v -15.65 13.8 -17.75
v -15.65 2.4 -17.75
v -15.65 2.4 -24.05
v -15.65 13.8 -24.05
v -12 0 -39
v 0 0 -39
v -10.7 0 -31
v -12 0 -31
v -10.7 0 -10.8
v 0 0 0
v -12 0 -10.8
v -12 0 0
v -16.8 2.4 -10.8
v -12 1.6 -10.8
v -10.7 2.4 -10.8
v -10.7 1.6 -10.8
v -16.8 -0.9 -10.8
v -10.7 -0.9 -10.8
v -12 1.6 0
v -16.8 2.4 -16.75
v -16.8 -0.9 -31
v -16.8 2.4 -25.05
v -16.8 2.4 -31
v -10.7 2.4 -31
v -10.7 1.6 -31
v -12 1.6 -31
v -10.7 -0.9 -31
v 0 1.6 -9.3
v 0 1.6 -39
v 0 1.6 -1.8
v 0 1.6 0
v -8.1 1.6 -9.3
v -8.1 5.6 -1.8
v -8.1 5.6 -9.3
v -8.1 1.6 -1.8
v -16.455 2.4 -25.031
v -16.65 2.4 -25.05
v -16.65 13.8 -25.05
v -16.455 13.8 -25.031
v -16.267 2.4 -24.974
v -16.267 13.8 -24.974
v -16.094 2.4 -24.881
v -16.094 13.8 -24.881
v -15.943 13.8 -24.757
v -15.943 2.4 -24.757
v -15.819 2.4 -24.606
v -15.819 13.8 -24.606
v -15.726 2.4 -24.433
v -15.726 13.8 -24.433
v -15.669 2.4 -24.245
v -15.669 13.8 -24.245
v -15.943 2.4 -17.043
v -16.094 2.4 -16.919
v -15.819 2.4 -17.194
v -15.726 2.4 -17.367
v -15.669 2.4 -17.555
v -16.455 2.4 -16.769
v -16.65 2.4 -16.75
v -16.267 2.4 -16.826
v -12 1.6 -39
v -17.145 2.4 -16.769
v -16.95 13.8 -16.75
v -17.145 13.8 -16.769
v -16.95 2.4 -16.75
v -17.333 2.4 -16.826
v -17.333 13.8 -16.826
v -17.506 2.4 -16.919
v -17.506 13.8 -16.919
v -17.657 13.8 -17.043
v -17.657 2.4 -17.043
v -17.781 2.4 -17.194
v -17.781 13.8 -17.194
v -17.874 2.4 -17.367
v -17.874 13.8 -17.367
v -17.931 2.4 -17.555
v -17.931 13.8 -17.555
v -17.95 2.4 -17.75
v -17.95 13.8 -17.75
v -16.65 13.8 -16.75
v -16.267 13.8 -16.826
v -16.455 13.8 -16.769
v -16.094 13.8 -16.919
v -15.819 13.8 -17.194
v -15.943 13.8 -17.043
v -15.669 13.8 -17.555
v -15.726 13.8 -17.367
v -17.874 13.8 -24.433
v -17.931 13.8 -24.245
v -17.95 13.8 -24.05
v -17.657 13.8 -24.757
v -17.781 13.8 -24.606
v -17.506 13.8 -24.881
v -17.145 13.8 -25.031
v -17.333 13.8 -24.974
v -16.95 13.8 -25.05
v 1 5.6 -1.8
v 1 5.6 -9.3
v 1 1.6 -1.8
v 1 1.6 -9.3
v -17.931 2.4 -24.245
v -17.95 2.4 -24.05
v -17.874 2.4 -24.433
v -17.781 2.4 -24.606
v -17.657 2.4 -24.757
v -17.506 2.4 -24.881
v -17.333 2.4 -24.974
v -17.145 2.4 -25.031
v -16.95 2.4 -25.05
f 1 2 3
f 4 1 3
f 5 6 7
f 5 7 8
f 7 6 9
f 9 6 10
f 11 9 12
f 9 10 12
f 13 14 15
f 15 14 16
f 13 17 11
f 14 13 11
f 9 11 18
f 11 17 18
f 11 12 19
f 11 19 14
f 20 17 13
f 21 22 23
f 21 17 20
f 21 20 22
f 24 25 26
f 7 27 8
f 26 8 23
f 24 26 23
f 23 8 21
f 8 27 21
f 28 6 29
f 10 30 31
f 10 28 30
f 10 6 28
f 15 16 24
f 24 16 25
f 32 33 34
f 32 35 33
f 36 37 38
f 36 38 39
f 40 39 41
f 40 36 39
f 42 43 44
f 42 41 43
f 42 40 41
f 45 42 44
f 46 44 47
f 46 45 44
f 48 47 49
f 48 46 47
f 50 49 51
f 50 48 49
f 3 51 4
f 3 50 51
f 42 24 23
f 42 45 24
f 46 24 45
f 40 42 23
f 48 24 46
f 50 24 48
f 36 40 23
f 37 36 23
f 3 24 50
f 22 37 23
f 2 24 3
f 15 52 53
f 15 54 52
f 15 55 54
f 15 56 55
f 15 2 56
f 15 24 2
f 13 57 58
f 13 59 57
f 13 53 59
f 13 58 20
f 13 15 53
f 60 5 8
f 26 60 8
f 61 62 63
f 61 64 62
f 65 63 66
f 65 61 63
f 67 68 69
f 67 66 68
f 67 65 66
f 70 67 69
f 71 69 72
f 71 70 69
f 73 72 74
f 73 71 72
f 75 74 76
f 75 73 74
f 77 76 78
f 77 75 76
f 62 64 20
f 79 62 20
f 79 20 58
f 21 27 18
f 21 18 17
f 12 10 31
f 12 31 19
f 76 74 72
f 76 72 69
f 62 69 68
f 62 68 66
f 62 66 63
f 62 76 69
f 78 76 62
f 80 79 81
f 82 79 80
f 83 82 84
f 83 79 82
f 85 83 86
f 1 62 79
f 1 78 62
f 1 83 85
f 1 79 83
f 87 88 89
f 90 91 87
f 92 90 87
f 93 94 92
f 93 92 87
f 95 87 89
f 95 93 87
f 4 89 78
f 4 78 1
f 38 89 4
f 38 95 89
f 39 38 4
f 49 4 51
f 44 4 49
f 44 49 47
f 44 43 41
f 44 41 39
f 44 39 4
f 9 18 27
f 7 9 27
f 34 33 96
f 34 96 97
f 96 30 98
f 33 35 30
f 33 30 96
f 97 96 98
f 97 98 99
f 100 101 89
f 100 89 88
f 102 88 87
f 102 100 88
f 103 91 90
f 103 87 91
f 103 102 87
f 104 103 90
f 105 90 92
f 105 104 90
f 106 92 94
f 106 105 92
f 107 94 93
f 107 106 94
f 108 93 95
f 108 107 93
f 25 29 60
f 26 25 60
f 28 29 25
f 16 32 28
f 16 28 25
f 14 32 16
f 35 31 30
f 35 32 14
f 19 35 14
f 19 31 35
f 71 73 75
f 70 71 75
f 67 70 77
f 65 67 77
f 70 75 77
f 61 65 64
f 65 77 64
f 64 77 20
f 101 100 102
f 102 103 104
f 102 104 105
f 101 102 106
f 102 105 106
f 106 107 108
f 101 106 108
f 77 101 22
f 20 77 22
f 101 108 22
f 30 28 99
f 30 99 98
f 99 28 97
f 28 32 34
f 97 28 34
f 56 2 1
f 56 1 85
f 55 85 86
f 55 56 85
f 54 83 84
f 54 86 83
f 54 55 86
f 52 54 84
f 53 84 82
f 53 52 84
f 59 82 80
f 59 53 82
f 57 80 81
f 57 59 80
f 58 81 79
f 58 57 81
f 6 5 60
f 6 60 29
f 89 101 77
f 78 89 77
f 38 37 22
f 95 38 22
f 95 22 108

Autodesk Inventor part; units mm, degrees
ref_plane "YZ Plane" through (0, 0, 0) normal (1, 0, 0) x (0, 1, 0)
ref_plane "XZ Plane" through (0, 0, 0) normal (0, 1, 0) x (-1, 0, 0)
ref_plane "XY Plane" through (0, 0, 0) normal (0, 0, 1) x (1, 0, 0)
sketch "Sketch1" plane through (0, 0, 0) normal (0, 1, 0) x (-1, 0, 0)
  line L0 (0, 0) -> (16.8, 0)
  line L1 (16.8, 0) -> (16.8, -39)
  line L2 (16.8, -39) -> (0, -39)
  line L3 (0, -39) -> (0, 0)
  line L4 (16.8, -10.8) -> (10.7, -10.8)
  line L5 (10.7, -10.8) -> (10.7, -31)
  line L6 (10.7, -31) -> (16.8, -31)
  line L7 (16.8, -31) -> (16.8, -10.8)
  line L8 (0, -25.4905) -> (10.7, -25.4905)
  line L9 (10.7, -25.4905) -> (10.7, -14.3627)
  line L10 (10.7, -14.3627) -> (0, -14.3627)
  line L11 (0, -14.3627) -> (0, -25.4905)
  dimension "d0" = 16.8
  dimension "d1" = 39
  dimension "d2" = 6.1
  dimension "d3" = 20.2
  dimension "d4" = 0
  dimension "d5" = 10.7
  dimension "d6" = 8
extrude "Extrusion1" add sketch "Sketch1" along normal blind 1.6 contours L0 L1 L4 L5 L10 L3 | L10 L5 L8 L3 | L8 L5 L6 L1 L2 L3
extrude "Extrusion2" add sketch "Sketch1" along normal blind 2.4 and the other way blind 0.9 contours L1 L6 L5 L4
sketch "Sketch2" plane through (0, 2.4, 0) normal (0, 1, 0) x (1, 0, 0)
  line L0 (-16.95, 16.75) -> (-16.65, 16.75)
  line L1 (-15.65, 17.75) -> (-15.65, 24.05)
  line L2 (-16.65, 25.05) -> (-16.95, 25.05)
  line L3 (-17.95, 24.05) -> (-17.95, 17.75)
  line L4 (-16.8, 31) -> (-16.8, 10.8) projected
  line L5 (-10.7, 31) -> (-16.8, 31) projected
  line L6 (-16.8, 10.8) -> (-10.7, 10.8) projected
  arc A0 (-16.95, 25.05) -> (-17.95, 24.05) centre (-16.95, 24.05) ccw
  arc A1 (-15.65, 24.05) -> (-16.65, 25.05) centre (-16.65, 24.05) ccw
  arc A2 (-17.95, 17.75) -> (-16.95, 16.75) centre (-16.95, 17.75) ccw
  arc A3 (-16.65, 16.75) -> (-15.65, 17.75) centre (-16.65, 17.75) ccw
  point P0 (0, 0)
  point P1 (-17.95, 16.75)
  point P2 (-15.65, 25.05)
  point P3 (-17.95, 25.05)
  dimension "d13" = 2.3
  dimension "d14" = 8.3
  dimension "d15" = 1.15
  dimension "d16" = 5.95
  dimension "d17" = 5.95
  dimension "d18" = 1
extrude "Extrusion3" add sketch "Sketch2" along normal blind 11.4
sketch "Sketch3" plane through (0, 0, 0) normal (0, -1, 0) x (1, 0, 0)
  line L0 (0, 0) -> (0, -39) projected
  line L1 (0, 0) -> (-12, 0)
  line L2 (-12, 0) -> (-12, -10.8)
  line L3 (-12, -10.8) -> (0, -10.8)
  line L4 (0, -10.8) -> (0, 0)
  line L5 (-10.7, -31) -> (-16.8, -31) projected
  line L6 (-12, -31) -> (0, -31)
  line L7 (0, -31) -> (0, -39)
  line L8 (0, -39) -> (-12, -39)
  line L9 (-12, -39) -> (-12, -31)
  line L10 (-16.8, -39) -> (-12, -39)
  line L11 (-12, -39) -> (-12, -31)
  line L12 (-12, -31) -> (-16.8, -31)
  line L13 (-16.8, -31) -> (-16.8, -39)
  line L14 (-16.8, -10.8) -> (-12, -10.8)
  line L15 (-12, -10.8) -> (-12, 0)
  line L16 (-12, 0) -> (-16.8, 0)
  line L17 (-16.8, 0) -> (-16.8, -10.8)
  dimension "d21" = 12
  dimension "d22" = 10.8
extrude "Extrusion4" cut sketch "Sketch3" against normal blind 10.1 contours L2 L14 L17 L16 | L10 L13 L5 L9
sketch "Sketch4" plane through (0, 1.6, 0) normal (0, 1, 0) x (1, 0, 0)
  line L0 (0, 0) -> (0, 39) projected
  line L1 (0, 1.8) -> (-8.1, 1.8)
  line L2 (-8.1, 1.8) -> (-8.1, 9.3)
  line L3 (-8.1, 9.3) -> (0, 9.3)
  line L4 (0, 9.3) -> (0, 1.8)
  line L5 (-12, 0) -> (0, 0) projected
  point P0 (0, 9.3)
  dimension "d25" = 8.1
  dimension "d26" = 7.5
  dimension "d27" = 1.8
extrude "Extrusion5" add sketch "Sketch4" along normal blind 4
sketch "Sketch5" plane through (0, 0, 0) normal (1, 0, 0) x (0, 0, -1)
  line L0 (1.8, 5.6) -> (9.3, 5.6) projected
  line L1 (9.3, 1.6) -> (9.3, 5.6) projected
  line L2 (1.8, 5.6) -> (9.3, 5.6)
  line L3 (9.3, 5.6) -> (9.3, 1.6)
  line L4 (9.3, 1.6) -> (1.8, 1.6)
  line L5 (1.8, 1.6) -> (1.8, 5.6)
  point P0 (0, 0)
extrude "Extrusion6" add sketch "Sketch5" along normal blind 1
properties part number "eonPCB"
